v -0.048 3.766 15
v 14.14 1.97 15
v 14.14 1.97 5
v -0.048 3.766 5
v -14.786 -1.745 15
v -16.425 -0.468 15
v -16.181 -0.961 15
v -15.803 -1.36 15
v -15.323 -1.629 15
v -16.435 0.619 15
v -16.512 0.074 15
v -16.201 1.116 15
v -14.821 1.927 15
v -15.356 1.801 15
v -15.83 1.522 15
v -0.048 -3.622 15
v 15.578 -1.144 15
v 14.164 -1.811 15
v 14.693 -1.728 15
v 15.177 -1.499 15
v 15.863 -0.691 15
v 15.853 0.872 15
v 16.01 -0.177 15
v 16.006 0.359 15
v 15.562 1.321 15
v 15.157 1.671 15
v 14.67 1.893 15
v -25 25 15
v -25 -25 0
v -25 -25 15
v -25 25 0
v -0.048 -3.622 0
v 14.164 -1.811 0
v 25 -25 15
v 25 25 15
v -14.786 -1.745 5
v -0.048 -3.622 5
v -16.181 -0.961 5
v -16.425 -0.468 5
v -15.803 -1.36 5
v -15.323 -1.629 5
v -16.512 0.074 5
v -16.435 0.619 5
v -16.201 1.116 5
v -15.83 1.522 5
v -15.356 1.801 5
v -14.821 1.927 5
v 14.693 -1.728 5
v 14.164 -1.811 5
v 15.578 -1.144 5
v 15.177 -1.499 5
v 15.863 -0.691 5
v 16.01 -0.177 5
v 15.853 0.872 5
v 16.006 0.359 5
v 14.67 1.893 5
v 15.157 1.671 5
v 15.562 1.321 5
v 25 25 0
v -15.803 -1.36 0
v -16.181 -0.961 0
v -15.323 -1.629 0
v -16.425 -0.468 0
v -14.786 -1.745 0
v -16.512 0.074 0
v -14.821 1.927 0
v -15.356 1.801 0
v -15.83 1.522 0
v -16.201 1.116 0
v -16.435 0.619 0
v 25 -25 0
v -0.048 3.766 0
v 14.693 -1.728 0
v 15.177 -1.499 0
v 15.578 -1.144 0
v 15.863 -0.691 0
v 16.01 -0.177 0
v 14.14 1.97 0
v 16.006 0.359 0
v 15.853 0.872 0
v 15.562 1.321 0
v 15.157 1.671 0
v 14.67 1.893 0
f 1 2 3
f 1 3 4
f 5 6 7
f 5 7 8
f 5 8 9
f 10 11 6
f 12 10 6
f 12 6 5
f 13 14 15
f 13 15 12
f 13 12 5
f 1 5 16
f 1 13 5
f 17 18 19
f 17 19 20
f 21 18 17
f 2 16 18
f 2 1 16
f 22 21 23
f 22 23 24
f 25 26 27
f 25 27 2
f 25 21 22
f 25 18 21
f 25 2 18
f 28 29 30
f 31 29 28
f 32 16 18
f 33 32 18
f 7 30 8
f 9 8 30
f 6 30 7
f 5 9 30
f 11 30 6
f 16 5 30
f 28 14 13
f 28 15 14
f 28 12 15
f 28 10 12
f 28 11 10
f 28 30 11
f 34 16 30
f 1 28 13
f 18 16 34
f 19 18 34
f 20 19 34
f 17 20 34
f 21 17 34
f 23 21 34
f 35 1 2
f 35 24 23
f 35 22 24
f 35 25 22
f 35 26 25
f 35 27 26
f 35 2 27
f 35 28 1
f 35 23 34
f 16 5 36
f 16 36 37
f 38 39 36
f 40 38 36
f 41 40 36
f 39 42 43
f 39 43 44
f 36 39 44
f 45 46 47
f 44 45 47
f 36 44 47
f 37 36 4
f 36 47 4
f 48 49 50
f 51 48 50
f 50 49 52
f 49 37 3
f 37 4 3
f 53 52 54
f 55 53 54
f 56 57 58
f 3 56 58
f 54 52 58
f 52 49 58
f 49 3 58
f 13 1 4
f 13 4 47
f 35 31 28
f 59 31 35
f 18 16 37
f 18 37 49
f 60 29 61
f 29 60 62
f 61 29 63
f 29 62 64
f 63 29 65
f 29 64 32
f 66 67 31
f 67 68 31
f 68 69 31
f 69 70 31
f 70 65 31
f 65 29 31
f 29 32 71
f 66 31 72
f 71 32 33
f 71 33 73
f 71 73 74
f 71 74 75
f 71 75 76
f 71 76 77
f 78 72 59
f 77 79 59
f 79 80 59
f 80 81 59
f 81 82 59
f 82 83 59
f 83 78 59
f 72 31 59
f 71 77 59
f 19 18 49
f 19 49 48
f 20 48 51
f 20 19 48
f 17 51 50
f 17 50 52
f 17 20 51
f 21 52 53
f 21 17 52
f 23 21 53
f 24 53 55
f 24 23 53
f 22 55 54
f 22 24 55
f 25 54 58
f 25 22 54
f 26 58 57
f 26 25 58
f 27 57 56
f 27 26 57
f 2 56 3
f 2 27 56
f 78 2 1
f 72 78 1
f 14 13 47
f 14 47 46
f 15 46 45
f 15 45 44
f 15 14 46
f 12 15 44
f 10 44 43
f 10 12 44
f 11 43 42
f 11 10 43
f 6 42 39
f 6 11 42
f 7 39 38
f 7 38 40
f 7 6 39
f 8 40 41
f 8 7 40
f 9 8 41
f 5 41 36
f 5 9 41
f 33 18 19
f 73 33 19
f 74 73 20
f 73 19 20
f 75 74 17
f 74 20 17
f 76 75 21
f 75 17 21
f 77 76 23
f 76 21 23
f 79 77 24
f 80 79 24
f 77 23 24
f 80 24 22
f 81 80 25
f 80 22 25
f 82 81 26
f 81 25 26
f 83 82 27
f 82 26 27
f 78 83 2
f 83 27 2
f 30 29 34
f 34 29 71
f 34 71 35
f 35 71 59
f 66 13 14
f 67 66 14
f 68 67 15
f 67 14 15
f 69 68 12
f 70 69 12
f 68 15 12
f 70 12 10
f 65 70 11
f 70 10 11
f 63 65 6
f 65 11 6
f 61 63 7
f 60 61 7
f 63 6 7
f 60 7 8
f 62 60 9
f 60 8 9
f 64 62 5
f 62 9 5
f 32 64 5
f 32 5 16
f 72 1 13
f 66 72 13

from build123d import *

# Parameters (mm, degrees)
SKETCH_1_W          = 50
SKETCH_1_H          = 50
EXTRUDE_1_DEPTH     = 15
CUT_EXTRUDE_1_REACH = 40.406
EXTRUDE_3_DEPTH     = 10


with BuildPart() as part:
    # 草图1 → 凸台-拉伸1 (new body)
    with BuildSketch(Plane.XY):
        Rectangle(SKETCH_1_W, SKETCH_1_H)
    extrude(amount=EXTRUDE_1_DEPTH)

    # 草图2 → 切除-拉伸1 (cut, up to next)
    with BuildSketch(Plane.XY.offset(15), mode=Mode.PRIVATE) as cut_extrude_1_sk1:
        with BuildLine():
            Line((-14.785952776, -1.74496373), (-0.047775551, -3.622183986))
            Line((-0.047775551, -3.622183986), (14.163975636, -1.811427055))
            ThreePointArc((14.163975636, -1.811427055), (16.026917864, 0.091112846), (14.140474077, 1.970352496))
            Line((14.140474077, 1.970352496), (-0.047775551, 3.765510639))
            Line((-0.047775551, 3.765510639), (-14.821170511, 1.926562958))
            ThreePointArc((-14.821170511, 1.926562958), (-16.512366288, 0.07440855), (-14.785952776, -1.74496373))
        make_face()
    cut_extrude_1_tool1 = extrude(cut_extrude_1_sk1.sketch, amount=-CUT_EXTRUDE_1_REACH, mode=Mode.PRIVATE) & part.part
    add(cut_extrude_1_tool1.solids().sort_by_distance((-0.185871, 0.078308, 15))[0], mode=Mode.SUBTRACT)


with BuildPart() as body_2:
    # 草图3 → 凸台-拉伸3 (new body)
    with BuildSketch(Plane.XY.offset(15)):
        with BuildLine():
            Line((14.140474077, 1.970352496), (-0.047775551, 3.765510639))
            Line((-0.047775551, 3.765510639), (-14.821170511, 1.926562958))
            ThreePointArc((-14.821170511, 1.926562958), (-16.512366288, 0.07440855), (-14.785952776, -1.74496373))
            Line((-14.785952776, -1.74496373), (-0.047775551, -3.622183986))
            Line((-0.047775551, -3.622183986), (14.163975636, -1.811427055))
            ThreePointArc((14.163975636, -1.811427055), (16.026917864, 0.091112846), (14.140474077, 1.970352496))
        make_face()
    extrude(amount=-EXTRUDE_3_DEPTH)


solid = Compound([part.part, body_2.part])
